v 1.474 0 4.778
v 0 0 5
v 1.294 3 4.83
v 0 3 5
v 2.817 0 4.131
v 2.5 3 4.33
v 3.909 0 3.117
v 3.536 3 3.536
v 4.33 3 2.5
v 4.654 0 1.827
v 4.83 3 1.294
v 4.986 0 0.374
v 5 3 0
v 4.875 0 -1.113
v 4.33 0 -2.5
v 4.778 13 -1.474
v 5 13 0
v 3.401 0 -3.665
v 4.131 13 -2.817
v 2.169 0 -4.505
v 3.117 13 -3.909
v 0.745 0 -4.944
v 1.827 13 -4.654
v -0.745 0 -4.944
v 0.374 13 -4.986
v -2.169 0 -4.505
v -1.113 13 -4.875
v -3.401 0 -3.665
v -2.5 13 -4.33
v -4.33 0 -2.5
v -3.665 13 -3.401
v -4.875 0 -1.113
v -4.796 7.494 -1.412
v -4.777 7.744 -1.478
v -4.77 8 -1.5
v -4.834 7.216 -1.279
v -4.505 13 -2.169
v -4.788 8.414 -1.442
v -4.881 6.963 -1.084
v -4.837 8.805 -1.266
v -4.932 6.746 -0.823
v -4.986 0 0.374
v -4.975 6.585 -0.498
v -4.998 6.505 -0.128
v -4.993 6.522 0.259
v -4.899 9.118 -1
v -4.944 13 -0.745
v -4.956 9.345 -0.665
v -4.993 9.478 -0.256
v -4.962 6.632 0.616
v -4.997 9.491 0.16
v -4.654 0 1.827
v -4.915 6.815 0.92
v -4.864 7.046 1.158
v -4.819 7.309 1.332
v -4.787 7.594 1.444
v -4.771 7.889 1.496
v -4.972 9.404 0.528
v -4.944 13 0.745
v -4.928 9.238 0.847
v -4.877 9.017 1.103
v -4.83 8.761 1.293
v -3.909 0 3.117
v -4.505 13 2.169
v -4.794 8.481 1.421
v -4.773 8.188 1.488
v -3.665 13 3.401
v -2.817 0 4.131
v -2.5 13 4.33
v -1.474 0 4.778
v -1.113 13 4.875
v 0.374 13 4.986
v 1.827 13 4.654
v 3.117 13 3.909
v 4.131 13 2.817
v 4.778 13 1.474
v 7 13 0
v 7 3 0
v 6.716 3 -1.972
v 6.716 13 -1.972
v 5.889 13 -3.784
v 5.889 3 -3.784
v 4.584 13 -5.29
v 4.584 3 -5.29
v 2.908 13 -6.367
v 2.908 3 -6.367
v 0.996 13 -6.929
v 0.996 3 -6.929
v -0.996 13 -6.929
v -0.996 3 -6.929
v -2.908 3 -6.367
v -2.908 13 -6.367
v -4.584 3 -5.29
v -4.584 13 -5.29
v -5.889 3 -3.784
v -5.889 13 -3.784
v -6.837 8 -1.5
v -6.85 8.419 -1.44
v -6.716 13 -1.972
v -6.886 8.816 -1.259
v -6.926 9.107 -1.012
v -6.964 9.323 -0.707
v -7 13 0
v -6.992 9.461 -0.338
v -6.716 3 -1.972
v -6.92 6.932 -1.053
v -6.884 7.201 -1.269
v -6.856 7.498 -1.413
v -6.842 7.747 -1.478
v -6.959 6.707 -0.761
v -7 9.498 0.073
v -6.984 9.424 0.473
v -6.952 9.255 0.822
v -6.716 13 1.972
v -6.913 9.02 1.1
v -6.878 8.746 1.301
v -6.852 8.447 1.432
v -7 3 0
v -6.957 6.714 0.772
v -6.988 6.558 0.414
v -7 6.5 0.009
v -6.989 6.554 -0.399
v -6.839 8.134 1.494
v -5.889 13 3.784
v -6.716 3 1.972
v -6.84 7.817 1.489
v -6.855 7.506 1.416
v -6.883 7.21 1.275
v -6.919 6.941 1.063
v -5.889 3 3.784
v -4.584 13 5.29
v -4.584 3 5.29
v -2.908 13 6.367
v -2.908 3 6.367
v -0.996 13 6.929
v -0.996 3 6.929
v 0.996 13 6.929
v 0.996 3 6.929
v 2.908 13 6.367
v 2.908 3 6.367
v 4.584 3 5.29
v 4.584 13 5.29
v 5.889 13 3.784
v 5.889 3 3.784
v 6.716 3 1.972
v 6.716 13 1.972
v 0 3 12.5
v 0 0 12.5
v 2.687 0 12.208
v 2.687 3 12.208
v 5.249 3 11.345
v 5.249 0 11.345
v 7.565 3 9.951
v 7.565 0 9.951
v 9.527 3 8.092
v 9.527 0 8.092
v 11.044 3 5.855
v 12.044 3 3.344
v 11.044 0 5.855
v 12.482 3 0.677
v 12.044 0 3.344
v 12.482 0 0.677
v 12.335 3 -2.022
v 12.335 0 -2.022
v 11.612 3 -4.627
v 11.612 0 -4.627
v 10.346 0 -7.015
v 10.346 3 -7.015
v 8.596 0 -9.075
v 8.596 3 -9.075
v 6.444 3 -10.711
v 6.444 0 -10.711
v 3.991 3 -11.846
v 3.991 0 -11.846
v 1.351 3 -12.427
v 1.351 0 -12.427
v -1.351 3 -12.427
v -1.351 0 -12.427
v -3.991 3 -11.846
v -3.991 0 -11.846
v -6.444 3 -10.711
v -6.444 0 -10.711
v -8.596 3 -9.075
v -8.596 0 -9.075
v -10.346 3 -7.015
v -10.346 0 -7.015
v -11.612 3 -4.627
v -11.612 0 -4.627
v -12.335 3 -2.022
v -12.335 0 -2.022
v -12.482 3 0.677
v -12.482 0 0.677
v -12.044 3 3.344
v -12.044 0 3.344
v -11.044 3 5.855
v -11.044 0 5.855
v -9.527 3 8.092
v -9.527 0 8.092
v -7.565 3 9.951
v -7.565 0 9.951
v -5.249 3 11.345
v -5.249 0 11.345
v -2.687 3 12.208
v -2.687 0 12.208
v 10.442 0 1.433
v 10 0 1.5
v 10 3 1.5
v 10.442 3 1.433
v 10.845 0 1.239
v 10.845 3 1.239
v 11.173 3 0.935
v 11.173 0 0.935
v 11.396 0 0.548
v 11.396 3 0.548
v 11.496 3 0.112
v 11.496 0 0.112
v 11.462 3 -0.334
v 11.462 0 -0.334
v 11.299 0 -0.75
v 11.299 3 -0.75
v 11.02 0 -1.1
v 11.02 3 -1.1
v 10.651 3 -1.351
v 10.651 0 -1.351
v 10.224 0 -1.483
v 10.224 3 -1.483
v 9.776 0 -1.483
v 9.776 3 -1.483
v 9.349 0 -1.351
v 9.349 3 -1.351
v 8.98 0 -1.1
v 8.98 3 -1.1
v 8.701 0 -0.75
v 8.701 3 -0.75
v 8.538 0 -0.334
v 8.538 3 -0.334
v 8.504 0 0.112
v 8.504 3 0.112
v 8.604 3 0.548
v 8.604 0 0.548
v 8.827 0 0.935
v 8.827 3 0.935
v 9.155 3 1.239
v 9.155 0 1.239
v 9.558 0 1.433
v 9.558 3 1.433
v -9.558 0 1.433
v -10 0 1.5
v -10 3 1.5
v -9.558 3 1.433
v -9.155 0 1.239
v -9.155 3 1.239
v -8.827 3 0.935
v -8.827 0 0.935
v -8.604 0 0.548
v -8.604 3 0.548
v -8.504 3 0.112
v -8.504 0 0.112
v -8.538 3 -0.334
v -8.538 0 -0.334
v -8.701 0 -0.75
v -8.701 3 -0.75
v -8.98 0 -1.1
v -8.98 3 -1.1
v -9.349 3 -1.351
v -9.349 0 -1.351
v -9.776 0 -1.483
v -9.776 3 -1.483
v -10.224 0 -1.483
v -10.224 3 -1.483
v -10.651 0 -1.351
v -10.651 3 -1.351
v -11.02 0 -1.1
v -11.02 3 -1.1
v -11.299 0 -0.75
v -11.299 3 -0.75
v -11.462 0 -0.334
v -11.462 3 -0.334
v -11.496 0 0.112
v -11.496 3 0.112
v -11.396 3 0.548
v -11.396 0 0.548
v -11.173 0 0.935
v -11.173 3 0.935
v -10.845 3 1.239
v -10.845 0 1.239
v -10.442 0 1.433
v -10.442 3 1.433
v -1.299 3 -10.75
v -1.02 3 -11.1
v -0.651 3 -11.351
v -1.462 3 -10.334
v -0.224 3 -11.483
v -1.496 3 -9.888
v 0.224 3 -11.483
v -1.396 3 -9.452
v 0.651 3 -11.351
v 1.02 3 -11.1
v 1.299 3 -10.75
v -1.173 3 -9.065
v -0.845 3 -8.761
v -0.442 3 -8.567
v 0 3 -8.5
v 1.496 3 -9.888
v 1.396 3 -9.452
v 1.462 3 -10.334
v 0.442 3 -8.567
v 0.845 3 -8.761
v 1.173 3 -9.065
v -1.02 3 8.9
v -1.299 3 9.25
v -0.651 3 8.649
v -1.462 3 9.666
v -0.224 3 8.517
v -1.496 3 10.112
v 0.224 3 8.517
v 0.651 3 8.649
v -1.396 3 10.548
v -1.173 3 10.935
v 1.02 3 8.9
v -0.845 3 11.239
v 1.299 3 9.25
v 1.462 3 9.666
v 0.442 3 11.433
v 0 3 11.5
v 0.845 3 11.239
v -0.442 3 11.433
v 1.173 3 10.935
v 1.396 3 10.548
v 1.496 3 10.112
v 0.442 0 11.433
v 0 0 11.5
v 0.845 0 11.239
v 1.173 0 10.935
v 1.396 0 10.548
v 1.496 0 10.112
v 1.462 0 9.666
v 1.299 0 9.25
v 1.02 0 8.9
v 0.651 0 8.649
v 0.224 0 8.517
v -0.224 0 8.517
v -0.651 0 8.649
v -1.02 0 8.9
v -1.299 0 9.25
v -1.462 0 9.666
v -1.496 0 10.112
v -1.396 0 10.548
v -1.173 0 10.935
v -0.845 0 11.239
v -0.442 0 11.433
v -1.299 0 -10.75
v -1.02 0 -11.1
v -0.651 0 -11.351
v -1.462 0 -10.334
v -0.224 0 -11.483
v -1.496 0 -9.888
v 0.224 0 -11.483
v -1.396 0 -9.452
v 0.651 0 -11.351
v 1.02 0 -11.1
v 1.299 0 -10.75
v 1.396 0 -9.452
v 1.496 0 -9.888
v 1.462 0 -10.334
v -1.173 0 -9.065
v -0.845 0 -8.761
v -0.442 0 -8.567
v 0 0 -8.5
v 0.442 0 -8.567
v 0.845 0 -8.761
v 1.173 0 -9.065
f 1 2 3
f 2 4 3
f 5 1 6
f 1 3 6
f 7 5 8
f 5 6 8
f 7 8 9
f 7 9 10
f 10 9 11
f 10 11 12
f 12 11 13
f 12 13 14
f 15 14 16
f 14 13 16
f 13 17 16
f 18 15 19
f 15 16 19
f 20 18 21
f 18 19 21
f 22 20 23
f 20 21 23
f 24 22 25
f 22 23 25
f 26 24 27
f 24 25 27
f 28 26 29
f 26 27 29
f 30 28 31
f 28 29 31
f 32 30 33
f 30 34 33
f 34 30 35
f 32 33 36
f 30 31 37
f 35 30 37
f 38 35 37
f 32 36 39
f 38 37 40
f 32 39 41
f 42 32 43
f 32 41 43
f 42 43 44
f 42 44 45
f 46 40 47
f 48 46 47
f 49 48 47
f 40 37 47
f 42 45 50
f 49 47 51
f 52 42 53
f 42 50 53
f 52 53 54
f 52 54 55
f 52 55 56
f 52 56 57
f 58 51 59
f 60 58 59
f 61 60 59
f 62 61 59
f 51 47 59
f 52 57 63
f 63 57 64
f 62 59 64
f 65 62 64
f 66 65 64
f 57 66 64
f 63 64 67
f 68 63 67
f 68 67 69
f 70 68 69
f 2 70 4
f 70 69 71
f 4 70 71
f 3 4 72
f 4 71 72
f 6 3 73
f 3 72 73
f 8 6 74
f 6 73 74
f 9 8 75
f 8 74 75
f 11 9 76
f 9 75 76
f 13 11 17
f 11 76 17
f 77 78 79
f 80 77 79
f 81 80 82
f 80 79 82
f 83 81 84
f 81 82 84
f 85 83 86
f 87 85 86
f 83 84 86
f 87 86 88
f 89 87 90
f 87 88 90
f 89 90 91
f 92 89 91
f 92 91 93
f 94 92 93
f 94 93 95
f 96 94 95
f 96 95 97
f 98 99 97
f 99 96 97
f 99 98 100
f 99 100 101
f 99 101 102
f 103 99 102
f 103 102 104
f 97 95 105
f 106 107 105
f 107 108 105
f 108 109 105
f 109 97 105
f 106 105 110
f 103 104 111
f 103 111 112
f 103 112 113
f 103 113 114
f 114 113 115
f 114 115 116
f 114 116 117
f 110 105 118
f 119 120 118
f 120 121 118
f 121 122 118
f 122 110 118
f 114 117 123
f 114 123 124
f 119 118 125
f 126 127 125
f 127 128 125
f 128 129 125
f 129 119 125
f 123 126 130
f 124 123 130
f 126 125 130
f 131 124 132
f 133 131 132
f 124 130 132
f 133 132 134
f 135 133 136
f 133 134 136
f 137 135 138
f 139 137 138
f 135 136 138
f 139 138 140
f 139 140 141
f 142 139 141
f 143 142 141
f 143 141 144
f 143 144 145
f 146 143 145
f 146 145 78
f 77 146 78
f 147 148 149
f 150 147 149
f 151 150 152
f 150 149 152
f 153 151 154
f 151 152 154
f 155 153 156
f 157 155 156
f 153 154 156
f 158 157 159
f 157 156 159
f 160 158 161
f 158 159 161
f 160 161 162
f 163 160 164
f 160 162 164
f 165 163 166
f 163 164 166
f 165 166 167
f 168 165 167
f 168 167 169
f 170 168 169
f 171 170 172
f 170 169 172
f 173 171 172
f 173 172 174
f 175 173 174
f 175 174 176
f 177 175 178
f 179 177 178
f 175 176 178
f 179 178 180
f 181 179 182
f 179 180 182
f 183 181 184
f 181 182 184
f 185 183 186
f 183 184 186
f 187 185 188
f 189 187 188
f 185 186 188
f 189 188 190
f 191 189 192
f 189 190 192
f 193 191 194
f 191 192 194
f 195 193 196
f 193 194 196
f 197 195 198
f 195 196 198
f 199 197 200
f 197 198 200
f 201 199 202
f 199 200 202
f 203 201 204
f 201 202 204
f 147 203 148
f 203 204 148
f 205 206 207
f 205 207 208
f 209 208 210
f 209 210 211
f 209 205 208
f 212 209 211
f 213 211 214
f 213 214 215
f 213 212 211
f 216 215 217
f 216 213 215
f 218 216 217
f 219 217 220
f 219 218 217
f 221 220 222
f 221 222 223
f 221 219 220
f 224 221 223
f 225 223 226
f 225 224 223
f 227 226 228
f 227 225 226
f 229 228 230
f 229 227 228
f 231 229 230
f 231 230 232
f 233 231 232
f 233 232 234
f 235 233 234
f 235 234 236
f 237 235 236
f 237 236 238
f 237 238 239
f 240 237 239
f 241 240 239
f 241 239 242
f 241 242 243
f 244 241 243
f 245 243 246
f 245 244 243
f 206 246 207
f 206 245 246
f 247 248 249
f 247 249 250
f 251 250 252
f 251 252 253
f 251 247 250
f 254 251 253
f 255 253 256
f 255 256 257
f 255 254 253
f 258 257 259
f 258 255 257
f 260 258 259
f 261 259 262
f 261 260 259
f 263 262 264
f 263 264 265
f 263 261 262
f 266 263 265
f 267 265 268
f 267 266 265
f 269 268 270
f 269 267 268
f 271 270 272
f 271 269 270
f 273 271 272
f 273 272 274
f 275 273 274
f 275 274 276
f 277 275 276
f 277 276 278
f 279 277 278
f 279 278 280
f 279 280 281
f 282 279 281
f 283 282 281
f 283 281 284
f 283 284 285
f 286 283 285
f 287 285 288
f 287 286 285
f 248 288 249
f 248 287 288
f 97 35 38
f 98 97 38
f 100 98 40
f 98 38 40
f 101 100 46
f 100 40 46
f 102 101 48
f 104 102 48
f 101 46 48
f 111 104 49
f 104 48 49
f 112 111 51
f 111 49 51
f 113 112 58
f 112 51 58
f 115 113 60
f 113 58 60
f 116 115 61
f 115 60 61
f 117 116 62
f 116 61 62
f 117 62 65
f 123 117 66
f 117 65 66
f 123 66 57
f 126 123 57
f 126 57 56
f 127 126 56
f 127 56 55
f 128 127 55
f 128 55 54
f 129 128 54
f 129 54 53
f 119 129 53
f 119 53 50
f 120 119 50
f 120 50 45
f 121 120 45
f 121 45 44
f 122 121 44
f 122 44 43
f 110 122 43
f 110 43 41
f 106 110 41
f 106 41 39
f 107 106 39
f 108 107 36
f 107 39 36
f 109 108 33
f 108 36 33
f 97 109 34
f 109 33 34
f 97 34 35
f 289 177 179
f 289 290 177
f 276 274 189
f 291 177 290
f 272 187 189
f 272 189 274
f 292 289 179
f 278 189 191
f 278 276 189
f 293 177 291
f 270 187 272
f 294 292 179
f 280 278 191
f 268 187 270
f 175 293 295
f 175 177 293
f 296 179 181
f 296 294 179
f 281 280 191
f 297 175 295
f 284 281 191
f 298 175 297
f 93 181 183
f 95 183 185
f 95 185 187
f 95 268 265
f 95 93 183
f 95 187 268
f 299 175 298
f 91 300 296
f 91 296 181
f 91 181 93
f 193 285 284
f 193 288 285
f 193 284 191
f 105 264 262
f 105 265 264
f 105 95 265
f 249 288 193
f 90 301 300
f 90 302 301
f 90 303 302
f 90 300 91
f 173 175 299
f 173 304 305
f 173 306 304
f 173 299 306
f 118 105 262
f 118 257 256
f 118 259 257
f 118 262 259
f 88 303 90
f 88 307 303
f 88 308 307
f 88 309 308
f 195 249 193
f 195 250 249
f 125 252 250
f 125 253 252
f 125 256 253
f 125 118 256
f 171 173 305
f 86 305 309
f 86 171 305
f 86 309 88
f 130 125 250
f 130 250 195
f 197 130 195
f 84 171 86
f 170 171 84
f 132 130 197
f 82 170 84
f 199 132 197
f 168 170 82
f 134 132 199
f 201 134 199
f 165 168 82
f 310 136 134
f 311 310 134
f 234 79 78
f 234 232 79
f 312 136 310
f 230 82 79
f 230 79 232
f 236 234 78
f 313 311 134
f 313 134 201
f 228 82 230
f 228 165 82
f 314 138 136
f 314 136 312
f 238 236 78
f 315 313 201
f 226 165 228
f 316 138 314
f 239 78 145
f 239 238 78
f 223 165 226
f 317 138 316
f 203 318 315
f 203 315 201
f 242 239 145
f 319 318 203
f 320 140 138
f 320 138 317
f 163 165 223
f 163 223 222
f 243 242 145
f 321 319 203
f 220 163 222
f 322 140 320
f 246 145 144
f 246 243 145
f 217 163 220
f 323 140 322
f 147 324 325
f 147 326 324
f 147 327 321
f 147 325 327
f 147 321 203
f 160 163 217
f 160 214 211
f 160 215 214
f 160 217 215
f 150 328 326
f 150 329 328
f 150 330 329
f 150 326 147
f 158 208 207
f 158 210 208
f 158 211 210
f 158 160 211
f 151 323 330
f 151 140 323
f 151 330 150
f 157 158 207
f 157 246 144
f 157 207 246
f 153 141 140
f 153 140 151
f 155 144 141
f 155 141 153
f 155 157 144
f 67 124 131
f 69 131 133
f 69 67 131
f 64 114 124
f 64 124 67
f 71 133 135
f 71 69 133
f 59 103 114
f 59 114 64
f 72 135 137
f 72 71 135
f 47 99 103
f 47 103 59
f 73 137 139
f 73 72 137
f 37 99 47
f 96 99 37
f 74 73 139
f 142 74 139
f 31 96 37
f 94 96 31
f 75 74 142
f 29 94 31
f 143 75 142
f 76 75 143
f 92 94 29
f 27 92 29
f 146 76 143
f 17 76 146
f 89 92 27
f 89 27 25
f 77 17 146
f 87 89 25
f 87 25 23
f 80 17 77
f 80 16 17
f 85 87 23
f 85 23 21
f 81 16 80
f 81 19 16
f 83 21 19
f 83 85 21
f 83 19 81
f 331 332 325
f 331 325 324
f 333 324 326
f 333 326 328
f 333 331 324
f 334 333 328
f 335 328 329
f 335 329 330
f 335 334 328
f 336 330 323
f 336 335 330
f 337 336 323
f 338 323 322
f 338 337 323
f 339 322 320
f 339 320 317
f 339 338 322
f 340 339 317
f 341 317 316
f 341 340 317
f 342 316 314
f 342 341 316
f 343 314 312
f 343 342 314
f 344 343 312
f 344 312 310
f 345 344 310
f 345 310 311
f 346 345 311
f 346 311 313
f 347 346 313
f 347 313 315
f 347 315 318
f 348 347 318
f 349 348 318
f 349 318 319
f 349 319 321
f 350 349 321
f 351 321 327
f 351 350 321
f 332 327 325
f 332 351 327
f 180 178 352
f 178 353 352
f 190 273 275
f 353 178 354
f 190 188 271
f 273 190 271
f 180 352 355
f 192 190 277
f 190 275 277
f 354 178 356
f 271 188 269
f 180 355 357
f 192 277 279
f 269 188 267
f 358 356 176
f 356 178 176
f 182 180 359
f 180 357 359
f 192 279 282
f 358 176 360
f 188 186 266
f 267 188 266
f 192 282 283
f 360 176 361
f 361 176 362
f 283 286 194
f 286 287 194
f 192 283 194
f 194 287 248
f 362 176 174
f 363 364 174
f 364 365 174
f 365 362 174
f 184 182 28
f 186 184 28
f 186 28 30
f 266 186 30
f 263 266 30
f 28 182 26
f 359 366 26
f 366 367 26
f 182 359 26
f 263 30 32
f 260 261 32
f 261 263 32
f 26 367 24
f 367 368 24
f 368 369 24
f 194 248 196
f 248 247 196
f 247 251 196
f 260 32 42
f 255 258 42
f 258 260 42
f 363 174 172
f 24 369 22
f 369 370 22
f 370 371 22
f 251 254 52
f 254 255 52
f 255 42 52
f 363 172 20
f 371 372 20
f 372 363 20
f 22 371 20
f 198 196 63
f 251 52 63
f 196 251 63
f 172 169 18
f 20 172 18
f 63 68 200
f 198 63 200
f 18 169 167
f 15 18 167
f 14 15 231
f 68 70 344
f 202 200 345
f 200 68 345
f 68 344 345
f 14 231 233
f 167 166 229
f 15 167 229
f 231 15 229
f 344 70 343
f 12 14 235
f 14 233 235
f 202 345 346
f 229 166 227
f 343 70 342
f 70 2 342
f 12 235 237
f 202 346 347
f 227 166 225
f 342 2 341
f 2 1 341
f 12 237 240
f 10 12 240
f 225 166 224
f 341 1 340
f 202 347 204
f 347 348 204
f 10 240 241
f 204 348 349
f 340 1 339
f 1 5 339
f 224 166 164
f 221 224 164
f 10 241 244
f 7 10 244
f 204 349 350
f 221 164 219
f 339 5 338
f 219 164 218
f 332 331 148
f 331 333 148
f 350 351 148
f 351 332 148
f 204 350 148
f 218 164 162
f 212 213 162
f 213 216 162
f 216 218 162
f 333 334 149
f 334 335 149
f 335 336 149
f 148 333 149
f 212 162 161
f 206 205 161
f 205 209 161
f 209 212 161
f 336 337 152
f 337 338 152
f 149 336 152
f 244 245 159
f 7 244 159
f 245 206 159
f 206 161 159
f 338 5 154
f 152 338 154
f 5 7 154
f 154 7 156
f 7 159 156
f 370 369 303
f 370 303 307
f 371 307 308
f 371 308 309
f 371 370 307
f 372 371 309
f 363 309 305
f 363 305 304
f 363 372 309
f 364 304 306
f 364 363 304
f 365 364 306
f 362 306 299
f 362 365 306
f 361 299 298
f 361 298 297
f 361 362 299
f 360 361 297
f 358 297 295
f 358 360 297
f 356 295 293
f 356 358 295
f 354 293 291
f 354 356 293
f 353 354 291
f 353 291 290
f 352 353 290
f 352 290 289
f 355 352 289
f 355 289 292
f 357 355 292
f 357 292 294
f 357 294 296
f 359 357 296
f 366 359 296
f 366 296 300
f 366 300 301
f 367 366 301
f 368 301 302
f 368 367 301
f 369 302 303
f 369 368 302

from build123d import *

# Parameters (mm, degrees)
IZIM1_R                     = 12.5
IZIM1_R_2                   = 1.5
Y_KSEKLIK_EKSTR_ZYON1_DEPTH = 3
IZIM2_R                     = 7
IZIM2_R_2                   = 5
EKSTR_ZYON_NCE1_DEPTH       = 10
IZIM3_R                     = 1.5
KES_EKSTR_ZYON1_DEPTH       = 22.943108257
IZIM2_2_R                   = 5
KES_EKSTR_ZYON2_DEPTH       = 21.310096061


with BuildPart() as part:
    # Çizim1 → Yükseklik-Ekstrüzyon1 (new body)
    with BuildSketch(Plane(origin=(0, 0, 0), x_dir=(1, 0, 0), z_dir=(0, 1, 0))):
        Circle(IZIM1_R)
        with Locations((10, 0)):
            Circle(IZIM1_R_2, mode=Mode.SUBTRACT)
        with Locations((0, -10)):
            Circle(IZIM1_R_2, mode=Mode.SUBTRACT)
        with Locations((-10, 0)):
            Circle(IZIM1_R_2, mode=Mode.SUBTRACT)
        with Locations((0, 10)):
            Circle(IZIM1_R_2, mode=Mode.SUBTRACT)
    extrude(amount=Y_KSEKLIK_EKSTR_ZYON1_DEPTH)

    # Çizim2 → Ekstrüzyon-İnce1 (add)
    with BuildSketch(Plane(origin=(0, 3, 0), x_dir=(1, 0, 0), z_dir=(0, 1, 0))):
        Circle(IZIM2_R)
        Circle(IZIM2_R_2, mode=Mode.SUBTRACT)
    extrude(amount=EKSTR_ZYON_NCE1_DEPTH)

    # Çizim3 → Kes-Ekstrüzyon1 (cut, through all)
    with BuildSketch(Plane(origin=(0, 0, 0), x_dir=(0, 0, -1), z_dir=(1, 0, 0))):
        with Locations((0, 8)):
            Circle(IZIM3_R)
    extrude(amount=-KES_EKSTR_ZYON1_DEPTH, mode=Mode.SUBTRACT)

    # Çizim2<2> → Kes-Ekstrüzyon2 (cut, through all)
    with BuildSketch(Plane(origin=(0, 3, 0), x_dir=(1, 0, 0), z_dir=(0, 1, 0))):
        Circle(IZIM2_2_R)
    extrude(amount=-KES_EKSTR_ZYON2_DEPTH, mode=Mode.SUBTRACT)


solid = part.part
